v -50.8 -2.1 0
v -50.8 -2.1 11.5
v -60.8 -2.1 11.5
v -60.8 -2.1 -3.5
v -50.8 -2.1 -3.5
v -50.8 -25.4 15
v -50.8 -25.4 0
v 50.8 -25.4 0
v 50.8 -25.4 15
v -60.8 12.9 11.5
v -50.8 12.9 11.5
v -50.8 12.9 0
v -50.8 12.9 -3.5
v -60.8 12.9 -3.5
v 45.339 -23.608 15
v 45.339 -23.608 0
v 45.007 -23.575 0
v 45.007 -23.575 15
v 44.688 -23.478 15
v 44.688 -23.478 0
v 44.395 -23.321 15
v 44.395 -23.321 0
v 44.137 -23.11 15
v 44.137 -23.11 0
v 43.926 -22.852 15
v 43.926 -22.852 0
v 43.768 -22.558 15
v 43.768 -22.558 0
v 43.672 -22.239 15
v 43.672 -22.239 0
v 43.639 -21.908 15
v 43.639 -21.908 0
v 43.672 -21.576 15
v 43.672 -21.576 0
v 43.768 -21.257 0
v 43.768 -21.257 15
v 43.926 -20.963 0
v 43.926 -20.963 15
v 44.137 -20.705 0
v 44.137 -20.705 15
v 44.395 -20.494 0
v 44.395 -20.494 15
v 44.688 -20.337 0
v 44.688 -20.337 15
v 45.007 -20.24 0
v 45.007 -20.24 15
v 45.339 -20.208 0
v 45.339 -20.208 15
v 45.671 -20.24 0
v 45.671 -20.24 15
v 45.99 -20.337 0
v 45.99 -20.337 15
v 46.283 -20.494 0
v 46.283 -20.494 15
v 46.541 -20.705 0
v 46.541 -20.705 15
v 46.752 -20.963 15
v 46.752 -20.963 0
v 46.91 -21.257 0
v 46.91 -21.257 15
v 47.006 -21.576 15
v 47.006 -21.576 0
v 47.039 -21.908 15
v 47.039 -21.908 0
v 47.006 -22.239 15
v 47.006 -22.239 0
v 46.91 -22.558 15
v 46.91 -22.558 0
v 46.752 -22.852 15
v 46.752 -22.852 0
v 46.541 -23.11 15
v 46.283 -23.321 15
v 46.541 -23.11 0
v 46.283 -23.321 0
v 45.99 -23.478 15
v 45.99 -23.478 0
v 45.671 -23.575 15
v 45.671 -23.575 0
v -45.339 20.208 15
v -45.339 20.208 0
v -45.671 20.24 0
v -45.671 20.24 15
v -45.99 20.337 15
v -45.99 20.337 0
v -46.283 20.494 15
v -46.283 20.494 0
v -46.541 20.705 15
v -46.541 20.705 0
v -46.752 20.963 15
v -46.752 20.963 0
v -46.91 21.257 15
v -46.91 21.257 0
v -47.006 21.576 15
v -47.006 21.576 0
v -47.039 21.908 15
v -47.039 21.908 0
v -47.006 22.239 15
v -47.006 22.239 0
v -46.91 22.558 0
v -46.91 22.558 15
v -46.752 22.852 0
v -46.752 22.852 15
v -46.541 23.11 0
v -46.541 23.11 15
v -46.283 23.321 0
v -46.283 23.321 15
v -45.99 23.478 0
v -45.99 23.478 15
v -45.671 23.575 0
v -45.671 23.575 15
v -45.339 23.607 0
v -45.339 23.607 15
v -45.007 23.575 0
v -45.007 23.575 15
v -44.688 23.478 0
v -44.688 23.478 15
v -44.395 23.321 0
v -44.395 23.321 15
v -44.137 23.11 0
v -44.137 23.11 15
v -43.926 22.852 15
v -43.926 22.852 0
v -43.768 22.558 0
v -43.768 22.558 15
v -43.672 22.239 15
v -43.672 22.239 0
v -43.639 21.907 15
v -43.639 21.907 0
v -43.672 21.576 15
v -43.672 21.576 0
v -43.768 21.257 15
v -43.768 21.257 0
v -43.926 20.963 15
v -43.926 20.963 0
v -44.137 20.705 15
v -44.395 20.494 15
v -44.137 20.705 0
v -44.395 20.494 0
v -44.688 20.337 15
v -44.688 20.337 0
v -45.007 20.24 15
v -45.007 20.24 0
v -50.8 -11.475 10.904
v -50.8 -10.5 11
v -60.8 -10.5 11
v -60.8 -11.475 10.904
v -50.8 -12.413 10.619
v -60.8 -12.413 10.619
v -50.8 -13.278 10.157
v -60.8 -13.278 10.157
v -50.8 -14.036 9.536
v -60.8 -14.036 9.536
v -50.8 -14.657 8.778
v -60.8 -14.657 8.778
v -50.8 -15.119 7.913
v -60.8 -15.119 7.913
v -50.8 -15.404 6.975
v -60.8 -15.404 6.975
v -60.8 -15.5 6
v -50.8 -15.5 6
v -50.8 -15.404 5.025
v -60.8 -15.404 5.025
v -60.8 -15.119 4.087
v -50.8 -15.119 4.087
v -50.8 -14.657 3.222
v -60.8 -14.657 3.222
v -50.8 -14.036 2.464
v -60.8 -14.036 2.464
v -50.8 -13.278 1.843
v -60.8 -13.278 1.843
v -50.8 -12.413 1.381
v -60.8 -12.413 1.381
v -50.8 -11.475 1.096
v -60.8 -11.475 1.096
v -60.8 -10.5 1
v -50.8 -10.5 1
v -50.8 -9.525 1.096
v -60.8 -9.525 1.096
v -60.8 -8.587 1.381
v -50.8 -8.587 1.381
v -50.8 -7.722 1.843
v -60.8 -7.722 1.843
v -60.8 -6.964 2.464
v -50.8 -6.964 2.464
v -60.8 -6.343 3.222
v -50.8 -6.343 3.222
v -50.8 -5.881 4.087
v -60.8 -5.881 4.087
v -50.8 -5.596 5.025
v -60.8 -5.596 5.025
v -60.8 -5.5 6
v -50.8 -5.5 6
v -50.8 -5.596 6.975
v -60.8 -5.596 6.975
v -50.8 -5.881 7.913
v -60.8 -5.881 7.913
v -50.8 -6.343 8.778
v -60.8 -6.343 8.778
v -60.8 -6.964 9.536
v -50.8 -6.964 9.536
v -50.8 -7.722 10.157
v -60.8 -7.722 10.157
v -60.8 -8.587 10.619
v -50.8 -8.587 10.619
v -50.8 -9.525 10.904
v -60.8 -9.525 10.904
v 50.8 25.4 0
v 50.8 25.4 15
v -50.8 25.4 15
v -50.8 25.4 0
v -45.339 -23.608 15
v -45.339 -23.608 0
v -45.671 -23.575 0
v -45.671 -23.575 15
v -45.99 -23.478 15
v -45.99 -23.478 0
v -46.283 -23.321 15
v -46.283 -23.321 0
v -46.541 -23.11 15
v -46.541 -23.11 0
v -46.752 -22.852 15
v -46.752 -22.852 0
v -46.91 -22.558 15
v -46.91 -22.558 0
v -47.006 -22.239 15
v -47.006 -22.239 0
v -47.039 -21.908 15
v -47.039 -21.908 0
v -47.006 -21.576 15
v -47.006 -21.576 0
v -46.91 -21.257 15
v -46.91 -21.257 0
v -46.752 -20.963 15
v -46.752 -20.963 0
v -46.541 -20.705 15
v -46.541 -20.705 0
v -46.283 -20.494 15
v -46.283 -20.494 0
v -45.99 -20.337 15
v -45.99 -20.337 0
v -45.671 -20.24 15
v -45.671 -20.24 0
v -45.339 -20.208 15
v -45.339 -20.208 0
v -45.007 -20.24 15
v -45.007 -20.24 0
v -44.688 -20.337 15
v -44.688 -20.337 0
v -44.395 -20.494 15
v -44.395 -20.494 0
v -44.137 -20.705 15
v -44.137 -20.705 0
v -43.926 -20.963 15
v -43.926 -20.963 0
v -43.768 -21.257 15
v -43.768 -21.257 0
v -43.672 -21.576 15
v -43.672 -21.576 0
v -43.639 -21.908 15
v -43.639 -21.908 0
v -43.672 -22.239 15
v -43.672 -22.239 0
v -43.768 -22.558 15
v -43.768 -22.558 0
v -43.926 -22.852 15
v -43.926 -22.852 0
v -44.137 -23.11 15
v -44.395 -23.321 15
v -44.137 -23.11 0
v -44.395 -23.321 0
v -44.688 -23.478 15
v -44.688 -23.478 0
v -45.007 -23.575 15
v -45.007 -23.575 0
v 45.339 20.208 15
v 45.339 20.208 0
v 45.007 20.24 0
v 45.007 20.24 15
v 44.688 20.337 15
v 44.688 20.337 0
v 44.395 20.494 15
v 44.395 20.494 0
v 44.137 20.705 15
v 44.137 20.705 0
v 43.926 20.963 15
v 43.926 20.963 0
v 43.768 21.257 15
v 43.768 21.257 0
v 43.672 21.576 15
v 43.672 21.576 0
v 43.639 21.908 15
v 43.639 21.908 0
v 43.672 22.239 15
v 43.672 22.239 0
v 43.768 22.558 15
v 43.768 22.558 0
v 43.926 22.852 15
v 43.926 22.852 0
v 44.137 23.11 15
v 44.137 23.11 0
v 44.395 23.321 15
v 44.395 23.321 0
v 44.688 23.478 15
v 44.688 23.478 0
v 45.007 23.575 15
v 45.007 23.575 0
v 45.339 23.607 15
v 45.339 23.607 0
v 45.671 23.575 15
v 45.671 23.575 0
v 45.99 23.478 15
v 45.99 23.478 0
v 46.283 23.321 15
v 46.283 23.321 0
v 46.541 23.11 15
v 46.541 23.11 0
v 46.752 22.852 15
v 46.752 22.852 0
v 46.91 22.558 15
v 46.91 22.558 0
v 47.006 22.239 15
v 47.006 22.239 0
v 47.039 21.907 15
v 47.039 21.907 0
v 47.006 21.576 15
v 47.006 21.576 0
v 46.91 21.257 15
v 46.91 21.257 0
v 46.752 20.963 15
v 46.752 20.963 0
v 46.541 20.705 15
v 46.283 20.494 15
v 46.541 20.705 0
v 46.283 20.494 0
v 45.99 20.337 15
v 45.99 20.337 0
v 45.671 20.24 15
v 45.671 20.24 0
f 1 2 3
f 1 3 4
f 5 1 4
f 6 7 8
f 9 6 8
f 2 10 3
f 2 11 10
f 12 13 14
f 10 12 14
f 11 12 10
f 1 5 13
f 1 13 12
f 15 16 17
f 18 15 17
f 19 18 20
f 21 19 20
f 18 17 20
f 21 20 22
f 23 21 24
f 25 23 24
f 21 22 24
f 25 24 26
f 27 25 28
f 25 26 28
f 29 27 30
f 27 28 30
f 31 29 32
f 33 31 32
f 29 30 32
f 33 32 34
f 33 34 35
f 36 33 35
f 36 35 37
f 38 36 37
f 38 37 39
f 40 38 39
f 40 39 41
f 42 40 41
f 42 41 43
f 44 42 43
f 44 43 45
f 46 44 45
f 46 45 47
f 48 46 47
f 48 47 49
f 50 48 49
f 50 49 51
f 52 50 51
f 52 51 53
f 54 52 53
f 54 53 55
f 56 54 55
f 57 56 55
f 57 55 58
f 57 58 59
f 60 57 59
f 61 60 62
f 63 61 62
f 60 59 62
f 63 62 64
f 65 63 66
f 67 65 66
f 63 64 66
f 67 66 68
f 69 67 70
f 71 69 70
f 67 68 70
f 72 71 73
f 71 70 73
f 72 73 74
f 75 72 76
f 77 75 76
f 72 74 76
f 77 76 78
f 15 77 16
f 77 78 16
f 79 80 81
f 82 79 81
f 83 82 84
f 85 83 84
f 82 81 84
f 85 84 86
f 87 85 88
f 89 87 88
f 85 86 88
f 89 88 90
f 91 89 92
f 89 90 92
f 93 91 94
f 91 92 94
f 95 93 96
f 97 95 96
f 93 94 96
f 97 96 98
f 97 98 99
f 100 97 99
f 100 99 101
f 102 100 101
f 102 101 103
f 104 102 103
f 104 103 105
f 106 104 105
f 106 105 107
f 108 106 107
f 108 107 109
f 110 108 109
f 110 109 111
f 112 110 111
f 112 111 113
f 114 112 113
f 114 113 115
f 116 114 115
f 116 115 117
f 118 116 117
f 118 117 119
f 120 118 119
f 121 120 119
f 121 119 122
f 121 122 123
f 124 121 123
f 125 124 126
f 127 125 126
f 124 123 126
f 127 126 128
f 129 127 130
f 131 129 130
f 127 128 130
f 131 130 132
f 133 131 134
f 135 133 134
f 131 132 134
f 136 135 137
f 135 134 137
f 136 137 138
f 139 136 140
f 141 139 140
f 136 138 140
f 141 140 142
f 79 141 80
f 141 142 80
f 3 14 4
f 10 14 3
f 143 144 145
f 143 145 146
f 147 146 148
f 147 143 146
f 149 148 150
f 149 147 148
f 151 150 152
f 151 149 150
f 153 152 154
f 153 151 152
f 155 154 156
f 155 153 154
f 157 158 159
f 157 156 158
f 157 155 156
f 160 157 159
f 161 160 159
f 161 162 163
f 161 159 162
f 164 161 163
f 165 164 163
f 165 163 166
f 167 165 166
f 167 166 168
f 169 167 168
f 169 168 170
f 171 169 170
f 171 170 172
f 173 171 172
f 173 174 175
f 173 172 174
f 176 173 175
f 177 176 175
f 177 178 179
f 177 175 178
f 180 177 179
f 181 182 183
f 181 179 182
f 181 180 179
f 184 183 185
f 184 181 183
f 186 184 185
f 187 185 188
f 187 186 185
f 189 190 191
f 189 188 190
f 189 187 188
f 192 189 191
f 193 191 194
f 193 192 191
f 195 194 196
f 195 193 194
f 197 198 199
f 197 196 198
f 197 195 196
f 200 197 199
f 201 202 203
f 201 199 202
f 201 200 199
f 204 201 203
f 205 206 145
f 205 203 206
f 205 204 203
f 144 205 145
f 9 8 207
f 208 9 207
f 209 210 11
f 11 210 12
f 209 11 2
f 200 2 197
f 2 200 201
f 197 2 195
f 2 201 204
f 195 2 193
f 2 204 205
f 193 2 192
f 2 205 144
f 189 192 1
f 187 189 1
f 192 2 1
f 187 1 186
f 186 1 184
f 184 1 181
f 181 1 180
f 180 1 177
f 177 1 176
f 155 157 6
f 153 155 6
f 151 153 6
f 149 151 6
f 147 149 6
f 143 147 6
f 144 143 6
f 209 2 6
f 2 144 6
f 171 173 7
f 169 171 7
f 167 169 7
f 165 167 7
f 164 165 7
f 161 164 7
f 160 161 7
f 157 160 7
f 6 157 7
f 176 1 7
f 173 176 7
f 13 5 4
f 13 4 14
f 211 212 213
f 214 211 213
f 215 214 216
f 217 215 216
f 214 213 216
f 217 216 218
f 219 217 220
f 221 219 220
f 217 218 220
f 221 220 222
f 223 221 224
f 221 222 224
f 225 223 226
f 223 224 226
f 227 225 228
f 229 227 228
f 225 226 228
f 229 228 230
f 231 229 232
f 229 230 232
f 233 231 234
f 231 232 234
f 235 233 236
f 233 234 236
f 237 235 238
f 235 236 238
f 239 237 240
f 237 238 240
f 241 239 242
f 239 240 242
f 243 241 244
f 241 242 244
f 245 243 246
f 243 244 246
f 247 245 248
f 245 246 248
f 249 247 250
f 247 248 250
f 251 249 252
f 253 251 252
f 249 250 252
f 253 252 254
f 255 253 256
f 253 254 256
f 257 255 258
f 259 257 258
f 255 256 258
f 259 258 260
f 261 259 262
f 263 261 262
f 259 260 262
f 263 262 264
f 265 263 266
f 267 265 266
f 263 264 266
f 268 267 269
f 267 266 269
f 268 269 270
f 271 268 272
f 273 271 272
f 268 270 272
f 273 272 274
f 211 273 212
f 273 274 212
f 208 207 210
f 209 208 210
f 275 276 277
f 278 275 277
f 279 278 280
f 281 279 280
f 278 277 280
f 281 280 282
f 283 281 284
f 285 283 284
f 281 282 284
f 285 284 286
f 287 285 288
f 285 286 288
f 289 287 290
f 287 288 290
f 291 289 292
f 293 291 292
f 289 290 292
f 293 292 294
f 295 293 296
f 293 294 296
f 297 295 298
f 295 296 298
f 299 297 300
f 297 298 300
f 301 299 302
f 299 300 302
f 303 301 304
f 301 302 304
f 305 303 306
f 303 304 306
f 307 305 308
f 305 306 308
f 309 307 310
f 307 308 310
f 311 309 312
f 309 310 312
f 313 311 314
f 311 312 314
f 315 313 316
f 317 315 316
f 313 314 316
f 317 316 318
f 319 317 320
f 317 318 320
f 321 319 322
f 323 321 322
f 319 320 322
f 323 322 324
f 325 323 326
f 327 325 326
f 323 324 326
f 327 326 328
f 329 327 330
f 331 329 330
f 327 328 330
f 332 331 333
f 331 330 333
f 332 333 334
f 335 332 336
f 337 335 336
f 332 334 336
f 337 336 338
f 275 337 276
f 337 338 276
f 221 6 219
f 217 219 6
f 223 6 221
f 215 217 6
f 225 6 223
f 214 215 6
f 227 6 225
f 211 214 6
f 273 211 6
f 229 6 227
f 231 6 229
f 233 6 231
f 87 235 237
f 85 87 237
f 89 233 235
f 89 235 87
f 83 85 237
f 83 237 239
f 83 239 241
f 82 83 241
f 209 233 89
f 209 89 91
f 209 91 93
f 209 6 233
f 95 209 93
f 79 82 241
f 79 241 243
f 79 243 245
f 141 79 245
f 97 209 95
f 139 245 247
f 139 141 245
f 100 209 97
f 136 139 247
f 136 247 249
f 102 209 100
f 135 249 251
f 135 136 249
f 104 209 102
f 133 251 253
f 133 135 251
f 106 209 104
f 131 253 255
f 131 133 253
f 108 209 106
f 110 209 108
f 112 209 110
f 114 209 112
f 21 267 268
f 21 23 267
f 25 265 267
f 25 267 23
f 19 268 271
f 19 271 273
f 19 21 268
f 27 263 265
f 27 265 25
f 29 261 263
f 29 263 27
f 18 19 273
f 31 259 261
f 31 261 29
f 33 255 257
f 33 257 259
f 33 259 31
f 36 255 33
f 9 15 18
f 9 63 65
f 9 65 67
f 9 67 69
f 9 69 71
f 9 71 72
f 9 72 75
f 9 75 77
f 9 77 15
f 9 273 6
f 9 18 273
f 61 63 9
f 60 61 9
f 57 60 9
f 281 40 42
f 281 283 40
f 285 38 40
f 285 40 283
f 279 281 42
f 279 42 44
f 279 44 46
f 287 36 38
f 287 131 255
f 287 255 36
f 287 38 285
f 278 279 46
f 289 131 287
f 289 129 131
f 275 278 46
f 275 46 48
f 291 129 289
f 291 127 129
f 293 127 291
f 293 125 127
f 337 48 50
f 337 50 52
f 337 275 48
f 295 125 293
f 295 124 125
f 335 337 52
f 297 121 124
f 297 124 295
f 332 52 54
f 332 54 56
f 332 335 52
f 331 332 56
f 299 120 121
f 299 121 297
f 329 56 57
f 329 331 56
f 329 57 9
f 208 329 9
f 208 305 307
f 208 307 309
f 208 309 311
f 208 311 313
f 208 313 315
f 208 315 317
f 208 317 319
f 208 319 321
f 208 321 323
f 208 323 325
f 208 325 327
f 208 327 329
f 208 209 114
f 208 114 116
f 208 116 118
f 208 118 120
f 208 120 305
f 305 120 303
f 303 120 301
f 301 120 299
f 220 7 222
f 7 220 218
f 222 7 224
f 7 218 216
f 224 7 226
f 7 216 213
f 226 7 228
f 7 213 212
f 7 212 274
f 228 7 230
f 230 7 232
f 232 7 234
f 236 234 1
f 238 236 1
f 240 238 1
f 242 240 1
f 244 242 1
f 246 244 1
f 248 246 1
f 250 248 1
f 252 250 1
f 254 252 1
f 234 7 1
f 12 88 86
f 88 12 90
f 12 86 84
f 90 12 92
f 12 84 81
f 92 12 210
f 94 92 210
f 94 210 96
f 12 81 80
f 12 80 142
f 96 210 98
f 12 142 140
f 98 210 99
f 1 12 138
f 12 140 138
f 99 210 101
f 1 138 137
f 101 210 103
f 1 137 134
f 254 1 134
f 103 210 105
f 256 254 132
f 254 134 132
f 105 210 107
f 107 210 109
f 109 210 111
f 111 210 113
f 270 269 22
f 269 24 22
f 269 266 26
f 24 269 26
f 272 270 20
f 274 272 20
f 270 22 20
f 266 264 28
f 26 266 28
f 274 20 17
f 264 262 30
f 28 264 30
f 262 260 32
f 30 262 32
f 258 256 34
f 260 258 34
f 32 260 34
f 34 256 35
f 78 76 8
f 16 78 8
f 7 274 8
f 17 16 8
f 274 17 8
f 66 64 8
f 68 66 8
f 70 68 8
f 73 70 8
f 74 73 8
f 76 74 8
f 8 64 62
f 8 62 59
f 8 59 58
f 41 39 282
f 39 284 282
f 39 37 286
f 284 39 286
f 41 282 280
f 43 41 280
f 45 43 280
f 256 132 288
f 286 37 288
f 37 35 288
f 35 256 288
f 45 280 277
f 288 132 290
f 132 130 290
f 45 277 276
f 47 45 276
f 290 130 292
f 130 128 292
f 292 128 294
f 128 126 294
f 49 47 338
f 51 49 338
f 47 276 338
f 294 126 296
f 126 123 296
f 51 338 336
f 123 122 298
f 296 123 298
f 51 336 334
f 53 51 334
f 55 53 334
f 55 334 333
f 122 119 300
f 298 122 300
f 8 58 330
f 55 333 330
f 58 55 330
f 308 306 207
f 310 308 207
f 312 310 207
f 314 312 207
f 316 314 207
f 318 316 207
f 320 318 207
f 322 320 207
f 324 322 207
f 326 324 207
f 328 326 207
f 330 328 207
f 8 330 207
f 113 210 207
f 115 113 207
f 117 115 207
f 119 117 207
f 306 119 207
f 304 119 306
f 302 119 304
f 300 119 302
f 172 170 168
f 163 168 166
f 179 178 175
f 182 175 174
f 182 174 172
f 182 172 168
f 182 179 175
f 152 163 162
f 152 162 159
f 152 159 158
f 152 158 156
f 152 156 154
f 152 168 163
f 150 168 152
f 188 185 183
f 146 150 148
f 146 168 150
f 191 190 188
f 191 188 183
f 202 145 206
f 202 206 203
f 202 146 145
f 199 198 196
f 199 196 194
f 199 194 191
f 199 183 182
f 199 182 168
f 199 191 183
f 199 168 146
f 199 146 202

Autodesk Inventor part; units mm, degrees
ref_plane "YZ Plane" through (0, 0, 0) normal (1, 0, 0) x (0, 1, 0)
ref_plane "XZ Plane" through (0, 0, 0) normal (0, 1, 0) x (-1, 0, 0)
ref_plane "XY Plane" through (0, 0, 0) normal (0, 0, 1) x (1, 0, 0)
sketch "Sketch1" plane through (0, 0, 0) normal (0, 0, 1) x (1, 0, 0)
  line L0 (-50.8, -25.4) -> (50.8, -25.4)
  line L1 (50.8, -25.4) -> (50.8, 25.4)
  line L2 (50.8, 25.4) -> (-50.8, 25.4)
  line L3 (-50.8, 25.4) -> (-50.8, -25.4)
  point P0 (0, 0)
  point P1 (0, 25.4)
  point P2 (50.8, 0)
  dimension "d10" = 6.5
  dimension "d0" = 50.8
  dimension "d2" = 101.6
extrude "Extrusion1" add sketch "Sketch1" along normal blind 15
sketch "Sketch2" plane through (0, 0, 15) normal (0, 0, 1) x (1, 0, 0)
  line L0 (50.8, -25.4) -> (50.8, 25.4) projected
  line L1 (50.8, 25.4) -> (-50.8, 25.4) projected
  line L2 (-45.339, 21.9075) -> (45.339, 21.9075)
  line L3 (45.339, 21.9075) -> (45.339, -21.9075)
  line L4 (45.339, -21.9075) -> (-45.339, -21.9075)
  line L5 (-45.339, -21.9075) -> (-45.339, 21.9075)
  point P0 (45.339, 0)
  point P1 (50.8, 0)
  point P2 (0, 21.9075)
  point P3 (0, 25.4)
  dimension "d5" = 43.815
  dimension "d7" = 90.678
hole "Hole1" at (-45.339, 21.9075, 15) at (45.339, 21.9075, 15) at (45.339, -21.9075, 15) at (-45.339, -21.9075, 15) direction (0, 0, -1) diameter 3.4 end through all clearance for "Socket Head Cap Screw" size "M3" standard "Ansi Metric M Profile"
sketch "Sketch3" plane through (-50.8, -25.4, 0) normal (-1, 0, 0) x (0, 0, 1)
  line L0 (0, 50.8) -> (0, 0) projected
  line L1 (0, 0) -> (15, 0) projected
  circle A0 centre (6, 14.9) radius 5
  point P0 (0, 25.4)
  dimension "d15" = 6
  dimension "d16" = 14.9
  dimension "d17" = 10
extrude "Extrusion2" add sketch "Sketch3" along normal blind 10
sketch "Sketch4" plane through (-50.8, 25.4, 0) normal (-1, 0, 0) x (0, 0, 1)
  circle A0 centre (6, -35.9) radius 5 projected
  line L0 (0, 0) -> (15, 0) projected
  line L1 (-3.5, -12.5) -> (11.5, -12.5)
  line L2 (11.5, -12.5) -> (11.5, -27.5)
  line L3 (11.5, -27.5) -> (-3.5, -27.5)
  line L4 (-3.5, -27.5) -> (-3.5, -12.5)
  point P0 (0, -27.9)
  point P1 (15, -31.5411)
  point P2 (0, -25.4)
  point P3 (-3.5, -20)
  point P4 (4, -12.5)
  dimension "d20" = 20
  dimension "d21" = 15
  dimension "d22" = 15
  dimension "d23" = 2
extrude "Extrusion3" add sketch "Sketch4" along normal blind 10 contours L1 L2 L3 L4
properties part number "electronics"
